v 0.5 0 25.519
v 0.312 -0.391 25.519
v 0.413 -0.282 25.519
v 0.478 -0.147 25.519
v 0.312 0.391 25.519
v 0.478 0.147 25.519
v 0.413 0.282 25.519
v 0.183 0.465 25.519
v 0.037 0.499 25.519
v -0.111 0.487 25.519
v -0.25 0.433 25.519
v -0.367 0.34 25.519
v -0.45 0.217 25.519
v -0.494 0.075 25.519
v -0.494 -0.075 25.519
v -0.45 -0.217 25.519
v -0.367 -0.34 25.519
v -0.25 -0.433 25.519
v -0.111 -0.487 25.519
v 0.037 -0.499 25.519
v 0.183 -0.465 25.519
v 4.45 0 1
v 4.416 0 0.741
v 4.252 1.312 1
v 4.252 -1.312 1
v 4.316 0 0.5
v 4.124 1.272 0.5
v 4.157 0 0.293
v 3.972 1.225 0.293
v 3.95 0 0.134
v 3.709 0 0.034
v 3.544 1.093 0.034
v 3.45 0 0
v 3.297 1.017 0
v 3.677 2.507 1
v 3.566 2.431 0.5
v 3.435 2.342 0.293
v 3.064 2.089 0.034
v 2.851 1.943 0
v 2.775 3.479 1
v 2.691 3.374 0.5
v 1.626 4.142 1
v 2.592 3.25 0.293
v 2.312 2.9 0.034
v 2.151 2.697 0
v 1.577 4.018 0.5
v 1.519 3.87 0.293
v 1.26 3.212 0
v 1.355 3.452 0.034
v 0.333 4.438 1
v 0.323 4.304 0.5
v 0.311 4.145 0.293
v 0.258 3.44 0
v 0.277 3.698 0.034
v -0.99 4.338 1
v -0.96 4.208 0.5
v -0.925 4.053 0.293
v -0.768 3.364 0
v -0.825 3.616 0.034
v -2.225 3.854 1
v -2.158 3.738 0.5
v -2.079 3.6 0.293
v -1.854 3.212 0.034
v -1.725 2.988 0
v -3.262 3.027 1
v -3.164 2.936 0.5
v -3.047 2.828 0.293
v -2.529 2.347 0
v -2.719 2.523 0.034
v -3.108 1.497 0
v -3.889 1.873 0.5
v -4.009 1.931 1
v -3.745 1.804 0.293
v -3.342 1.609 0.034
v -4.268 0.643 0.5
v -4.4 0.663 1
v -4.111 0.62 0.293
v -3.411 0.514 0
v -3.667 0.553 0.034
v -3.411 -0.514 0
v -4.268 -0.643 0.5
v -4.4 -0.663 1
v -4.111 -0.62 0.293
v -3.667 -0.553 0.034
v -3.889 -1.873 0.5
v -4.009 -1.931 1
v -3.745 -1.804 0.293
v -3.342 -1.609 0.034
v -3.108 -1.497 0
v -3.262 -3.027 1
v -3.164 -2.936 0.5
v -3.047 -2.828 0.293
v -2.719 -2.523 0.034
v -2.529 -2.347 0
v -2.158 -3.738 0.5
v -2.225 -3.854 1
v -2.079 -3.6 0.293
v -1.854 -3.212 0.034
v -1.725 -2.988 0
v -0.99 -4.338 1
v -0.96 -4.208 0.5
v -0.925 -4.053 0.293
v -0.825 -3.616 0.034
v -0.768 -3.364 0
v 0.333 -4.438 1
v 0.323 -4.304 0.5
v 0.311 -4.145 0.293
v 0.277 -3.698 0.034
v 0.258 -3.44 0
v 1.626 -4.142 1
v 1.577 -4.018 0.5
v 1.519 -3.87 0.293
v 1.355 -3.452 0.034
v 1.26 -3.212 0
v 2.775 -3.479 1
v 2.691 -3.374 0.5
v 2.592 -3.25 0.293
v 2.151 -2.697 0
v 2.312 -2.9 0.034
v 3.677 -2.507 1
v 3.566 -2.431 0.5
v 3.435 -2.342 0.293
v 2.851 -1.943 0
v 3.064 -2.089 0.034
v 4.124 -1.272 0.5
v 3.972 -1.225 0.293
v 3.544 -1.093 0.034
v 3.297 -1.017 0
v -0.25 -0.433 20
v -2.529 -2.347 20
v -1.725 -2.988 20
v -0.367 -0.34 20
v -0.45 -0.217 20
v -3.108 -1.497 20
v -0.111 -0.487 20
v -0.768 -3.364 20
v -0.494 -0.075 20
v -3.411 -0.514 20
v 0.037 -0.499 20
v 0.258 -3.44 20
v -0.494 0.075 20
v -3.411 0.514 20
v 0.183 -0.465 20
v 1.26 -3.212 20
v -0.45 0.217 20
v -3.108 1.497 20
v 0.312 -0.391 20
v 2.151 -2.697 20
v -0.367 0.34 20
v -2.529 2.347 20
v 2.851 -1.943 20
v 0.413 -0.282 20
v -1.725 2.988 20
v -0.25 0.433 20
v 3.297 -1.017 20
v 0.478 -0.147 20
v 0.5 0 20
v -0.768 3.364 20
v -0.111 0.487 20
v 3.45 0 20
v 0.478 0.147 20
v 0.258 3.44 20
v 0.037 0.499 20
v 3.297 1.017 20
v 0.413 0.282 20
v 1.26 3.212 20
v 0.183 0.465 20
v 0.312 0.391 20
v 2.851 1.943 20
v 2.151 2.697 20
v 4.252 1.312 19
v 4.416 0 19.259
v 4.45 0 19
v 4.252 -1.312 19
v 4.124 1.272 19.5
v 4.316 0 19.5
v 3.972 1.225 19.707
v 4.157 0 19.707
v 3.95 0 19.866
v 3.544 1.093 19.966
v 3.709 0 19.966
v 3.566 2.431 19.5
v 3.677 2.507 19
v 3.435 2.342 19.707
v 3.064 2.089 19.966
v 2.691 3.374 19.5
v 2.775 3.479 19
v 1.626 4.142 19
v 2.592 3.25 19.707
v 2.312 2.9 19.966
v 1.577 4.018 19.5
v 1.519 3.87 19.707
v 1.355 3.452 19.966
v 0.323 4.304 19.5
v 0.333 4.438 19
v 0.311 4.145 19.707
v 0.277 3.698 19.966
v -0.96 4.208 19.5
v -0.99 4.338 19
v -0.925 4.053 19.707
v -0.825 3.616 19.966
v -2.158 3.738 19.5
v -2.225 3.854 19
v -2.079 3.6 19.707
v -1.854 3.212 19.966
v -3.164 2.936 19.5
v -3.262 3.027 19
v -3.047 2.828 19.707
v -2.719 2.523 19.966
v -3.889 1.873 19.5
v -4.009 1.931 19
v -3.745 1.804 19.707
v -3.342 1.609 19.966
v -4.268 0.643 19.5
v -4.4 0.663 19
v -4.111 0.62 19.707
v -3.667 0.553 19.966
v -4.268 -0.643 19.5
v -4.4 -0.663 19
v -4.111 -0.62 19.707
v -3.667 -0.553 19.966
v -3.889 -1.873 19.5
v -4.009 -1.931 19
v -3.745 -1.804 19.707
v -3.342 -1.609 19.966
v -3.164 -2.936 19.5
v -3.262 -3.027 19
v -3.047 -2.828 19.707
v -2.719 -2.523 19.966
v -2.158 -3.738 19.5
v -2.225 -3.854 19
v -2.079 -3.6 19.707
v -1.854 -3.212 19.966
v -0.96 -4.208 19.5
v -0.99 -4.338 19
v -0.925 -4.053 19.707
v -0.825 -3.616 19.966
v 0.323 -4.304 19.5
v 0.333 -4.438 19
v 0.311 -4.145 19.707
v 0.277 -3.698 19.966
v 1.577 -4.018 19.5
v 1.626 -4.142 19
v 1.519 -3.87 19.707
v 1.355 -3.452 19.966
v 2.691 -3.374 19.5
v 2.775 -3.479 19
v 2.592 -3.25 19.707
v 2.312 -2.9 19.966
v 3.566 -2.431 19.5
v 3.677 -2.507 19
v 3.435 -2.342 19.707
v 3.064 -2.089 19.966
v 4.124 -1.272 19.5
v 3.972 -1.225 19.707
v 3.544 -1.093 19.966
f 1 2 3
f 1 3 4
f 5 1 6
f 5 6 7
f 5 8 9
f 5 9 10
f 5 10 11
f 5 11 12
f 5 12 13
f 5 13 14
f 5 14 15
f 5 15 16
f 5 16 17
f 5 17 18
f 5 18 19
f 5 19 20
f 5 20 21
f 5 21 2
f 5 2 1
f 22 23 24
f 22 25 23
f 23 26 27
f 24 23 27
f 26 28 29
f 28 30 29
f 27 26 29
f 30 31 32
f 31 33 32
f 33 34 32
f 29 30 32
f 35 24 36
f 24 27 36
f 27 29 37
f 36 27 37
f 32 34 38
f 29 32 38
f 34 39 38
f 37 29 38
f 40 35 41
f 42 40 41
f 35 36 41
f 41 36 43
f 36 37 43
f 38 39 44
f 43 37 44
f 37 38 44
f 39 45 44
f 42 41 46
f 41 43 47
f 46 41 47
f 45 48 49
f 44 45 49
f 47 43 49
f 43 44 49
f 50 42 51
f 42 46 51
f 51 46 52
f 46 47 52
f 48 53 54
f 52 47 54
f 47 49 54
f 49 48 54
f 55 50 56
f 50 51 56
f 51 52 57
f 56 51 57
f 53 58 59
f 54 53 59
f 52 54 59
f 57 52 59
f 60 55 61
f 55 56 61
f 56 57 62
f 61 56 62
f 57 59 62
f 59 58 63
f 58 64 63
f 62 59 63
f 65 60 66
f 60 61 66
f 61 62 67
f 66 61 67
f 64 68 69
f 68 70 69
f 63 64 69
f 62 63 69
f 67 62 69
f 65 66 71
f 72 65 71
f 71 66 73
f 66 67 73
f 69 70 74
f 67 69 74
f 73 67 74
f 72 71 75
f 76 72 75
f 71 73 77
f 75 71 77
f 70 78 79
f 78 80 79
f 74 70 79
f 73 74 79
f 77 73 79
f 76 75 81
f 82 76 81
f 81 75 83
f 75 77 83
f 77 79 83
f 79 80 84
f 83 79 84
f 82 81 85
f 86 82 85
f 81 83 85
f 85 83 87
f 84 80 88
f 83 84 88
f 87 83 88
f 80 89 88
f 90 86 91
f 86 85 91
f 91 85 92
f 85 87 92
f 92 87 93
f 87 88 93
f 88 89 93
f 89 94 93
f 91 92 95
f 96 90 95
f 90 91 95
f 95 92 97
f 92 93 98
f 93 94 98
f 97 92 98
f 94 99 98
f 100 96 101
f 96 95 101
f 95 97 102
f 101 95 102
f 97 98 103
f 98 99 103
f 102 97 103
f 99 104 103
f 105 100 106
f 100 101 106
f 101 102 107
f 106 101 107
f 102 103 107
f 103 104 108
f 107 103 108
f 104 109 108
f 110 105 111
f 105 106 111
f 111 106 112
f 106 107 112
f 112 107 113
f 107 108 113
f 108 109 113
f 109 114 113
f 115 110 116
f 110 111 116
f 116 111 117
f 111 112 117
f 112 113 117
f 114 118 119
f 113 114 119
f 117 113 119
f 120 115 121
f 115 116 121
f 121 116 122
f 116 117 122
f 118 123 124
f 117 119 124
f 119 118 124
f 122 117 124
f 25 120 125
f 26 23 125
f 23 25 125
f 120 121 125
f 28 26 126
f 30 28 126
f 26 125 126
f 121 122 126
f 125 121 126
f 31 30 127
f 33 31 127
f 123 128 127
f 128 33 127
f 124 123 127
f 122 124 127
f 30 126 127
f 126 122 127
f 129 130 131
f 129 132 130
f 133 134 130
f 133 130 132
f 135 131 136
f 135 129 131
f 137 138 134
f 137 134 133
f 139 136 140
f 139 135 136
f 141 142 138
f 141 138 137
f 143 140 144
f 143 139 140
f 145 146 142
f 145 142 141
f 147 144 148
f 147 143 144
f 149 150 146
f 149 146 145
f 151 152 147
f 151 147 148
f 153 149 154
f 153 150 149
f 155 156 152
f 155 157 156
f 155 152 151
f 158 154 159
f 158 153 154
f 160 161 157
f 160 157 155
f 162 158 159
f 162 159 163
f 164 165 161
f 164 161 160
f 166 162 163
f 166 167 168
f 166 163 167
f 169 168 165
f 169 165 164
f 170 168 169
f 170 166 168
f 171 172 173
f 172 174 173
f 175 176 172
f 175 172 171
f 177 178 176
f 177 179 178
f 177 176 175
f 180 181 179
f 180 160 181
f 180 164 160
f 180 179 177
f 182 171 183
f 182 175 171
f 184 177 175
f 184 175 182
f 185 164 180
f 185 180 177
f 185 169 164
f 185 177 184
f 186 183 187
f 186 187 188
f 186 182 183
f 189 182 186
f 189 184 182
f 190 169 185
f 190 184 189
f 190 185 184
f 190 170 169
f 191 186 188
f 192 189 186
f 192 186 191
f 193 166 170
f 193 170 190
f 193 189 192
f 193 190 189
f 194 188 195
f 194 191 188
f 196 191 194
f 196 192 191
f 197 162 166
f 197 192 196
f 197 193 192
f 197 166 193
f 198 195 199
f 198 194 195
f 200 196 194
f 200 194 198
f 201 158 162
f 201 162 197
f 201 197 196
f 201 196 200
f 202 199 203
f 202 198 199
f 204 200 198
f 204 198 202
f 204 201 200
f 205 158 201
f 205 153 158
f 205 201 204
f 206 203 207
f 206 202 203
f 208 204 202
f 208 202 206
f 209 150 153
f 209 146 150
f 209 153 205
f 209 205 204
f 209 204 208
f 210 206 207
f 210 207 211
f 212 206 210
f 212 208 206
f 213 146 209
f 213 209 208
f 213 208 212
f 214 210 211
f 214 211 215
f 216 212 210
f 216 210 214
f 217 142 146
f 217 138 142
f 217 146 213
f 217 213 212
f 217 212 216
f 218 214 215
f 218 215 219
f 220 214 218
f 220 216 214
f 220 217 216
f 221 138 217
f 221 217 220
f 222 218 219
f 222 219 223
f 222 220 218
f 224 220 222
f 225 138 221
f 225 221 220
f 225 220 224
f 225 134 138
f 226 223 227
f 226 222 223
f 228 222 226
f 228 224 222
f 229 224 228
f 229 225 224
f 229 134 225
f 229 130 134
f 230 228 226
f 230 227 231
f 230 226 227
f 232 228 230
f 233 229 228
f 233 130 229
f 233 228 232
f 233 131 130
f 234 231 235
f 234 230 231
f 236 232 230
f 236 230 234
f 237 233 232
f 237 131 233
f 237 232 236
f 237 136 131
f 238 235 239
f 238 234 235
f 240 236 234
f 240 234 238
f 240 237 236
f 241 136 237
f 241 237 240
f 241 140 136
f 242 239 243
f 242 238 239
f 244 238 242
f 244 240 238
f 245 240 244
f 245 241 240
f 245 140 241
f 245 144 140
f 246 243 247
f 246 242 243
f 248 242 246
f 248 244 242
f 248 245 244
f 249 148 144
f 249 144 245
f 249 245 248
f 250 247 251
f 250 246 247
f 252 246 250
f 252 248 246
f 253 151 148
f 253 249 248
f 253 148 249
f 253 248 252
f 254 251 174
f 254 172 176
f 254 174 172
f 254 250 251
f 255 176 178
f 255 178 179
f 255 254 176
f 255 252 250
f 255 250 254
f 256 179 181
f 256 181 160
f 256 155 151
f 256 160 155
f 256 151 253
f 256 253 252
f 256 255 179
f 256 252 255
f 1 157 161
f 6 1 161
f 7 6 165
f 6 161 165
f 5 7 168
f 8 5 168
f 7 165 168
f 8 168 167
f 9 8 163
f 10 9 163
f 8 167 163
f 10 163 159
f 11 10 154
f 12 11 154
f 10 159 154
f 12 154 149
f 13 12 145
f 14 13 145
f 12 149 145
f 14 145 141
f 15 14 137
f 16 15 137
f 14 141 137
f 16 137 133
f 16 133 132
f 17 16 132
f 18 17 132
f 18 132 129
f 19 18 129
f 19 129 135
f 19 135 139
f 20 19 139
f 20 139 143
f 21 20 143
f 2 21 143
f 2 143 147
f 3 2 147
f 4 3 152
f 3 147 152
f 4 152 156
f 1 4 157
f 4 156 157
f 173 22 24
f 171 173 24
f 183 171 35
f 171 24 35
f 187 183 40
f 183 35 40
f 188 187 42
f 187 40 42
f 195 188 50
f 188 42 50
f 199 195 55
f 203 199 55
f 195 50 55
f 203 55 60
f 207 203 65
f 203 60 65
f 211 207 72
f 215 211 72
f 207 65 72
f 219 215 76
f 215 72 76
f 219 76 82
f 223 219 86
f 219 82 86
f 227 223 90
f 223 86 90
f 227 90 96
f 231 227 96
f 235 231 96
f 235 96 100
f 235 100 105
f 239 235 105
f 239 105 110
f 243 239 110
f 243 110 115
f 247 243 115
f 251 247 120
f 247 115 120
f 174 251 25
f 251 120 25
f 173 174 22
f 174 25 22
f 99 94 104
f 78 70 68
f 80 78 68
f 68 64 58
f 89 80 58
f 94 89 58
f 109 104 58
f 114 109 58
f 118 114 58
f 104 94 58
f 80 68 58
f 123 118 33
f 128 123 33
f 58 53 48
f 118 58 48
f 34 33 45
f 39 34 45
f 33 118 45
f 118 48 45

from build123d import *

# Parameters (mm, degrees)
F0_R     = 4.45
F1_DEPTH = 20
F2_R     = 1
F3_R     = 0.5
F4_DEPTH = 5.519319


with BuildPart() as f1:
    # F0 (on Top) → F1 (new body)
    with BuildSketch(Plane.XY):
        Circle(F0_R)
    extrude(amount=F1_DEPTH)

    # F2
    f2_edges = [f1.edges().sort_by_distance(p)[0] for p in [
        (-4.45, 0, 20),
        (-4.45, 0, 0),
    ]]
    fillet(f2_edges, radius=F2_R)

    # F3 (on face) → F4 (join)
    with BuildSketch(Plane.XY.offset(20)):
        Circle(F3_R)
    extrude(amount=F4_DEPTH)


solid = f1.part
